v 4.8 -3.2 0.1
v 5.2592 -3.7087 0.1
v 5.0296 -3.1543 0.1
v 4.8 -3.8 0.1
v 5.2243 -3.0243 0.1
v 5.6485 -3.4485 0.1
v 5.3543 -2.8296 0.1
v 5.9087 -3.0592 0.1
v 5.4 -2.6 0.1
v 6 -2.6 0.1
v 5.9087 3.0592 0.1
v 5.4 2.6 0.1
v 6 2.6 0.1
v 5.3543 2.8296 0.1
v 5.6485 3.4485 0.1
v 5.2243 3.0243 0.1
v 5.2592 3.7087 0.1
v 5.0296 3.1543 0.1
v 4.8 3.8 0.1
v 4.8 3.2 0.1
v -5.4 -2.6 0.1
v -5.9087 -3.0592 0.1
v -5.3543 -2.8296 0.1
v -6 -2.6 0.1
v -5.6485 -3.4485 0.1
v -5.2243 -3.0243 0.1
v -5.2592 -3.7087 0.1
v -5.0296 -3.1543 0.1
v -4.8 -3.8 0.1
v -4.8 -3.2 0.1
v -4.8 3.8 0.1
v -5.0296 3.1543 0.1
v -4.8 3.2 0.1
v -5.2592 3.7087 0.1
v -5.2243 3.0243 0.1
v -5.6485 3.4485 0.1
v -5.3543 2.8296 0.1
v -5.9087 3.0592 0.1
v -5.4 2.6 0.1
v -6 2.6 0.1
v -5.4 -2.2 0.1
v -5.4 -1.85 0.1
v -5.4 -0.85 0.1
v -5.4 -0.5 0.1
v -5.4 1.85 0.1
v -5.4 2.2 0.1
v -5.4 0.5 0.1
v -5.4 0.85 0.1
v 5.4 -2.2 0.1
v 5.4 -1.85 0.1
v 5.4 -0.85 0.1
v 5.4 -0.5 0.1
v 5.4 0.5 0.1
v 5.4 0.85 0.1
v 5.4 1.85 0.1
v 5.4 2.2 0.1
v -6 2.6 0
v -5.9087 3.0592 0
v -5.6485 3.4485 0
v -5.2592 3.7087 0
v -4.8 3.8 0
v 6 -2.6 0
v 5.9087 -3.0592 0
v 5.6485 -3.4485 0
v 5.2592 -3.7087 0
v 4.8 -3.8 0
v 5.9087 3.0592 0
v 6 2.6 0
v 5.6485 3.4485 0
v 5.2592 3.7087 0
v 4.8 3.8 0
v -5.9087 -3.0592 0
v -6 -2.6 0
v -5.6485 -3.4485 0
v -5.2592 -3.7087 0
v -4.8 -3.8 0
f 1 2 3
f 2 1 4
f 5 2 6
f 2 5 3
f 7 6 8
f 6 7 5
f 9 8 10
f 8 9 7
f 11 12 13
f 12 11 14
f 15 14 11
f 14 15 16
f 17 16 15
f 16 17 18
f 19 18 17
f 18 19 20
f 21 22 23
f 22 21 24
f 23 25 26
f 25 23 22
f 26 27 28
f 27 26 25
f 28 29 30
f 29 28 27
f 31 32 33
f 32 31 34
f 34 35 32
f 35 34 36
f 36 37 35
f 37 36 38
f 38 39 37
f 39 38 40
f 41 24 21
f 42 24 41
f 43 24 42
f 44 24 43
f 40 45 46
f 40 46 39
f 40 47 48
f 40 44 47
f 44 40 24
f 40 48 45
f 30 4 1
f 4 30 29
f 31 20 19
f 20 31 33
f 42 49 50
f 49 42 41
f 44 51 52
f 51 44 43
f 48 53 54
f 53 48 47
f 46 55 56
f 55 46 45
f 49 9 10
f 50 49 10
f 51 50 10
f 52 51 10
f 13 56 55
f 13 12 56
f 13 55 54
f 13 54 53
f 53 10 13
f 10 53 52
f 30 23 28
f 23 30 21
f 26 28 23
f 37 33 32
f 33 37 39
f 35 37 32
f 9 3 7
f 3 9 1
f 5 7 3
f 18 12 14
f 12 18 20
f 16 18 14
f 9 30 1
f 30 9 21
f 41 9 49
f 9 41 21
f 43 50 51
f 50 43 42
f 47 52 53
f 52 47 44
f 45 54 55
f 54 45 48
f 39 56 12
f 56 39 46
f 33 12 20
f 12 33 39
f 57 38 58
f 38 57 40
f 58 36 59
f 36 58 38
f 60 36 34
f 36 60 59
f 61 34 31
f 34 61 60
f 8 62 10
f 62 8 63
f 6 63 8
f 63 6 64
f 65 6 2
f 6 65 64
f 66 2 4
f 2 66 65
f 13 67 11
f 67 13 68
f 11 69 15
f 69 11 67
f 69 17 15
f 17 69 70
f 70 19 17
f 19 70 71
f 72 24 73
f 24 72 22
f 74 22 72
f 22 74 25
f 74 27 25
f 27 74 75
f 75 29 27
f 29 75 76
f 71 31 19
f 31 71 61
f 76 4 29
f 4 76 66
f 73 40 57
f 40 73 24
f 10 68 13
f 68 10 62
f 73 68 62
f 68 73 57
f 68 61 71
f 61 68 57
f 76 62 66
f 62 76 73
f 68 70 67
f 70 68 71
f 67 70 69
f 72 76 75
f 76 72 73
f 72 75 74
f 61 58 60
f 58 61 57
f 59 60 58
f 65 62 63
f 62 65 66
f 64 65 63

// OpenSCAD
// file: ../p/4-4edge.scad
use <../lib.scad>
$fa=1; $fs=0.2;
function ldraw_lib__4_4edge(realsolid=false) = [
// 0 Circle 1.0
// 0 Name: 4-4edge.dat
// 0 Author: James Jessiman
// 0 !LDRAW_ORG Primitive UPDATE 2017-01
// 0 !LICENSE Licensed under CC BY 2.0 and CC BY 4.0 : see CAreadme.txt
// 
// 0 BFC CERTIFY CCW
  [0,"BFC","CERTIFY"],
  [0,"BFC","CCW"],
// 
// 0 !HISTORY 1998-12-15 [PTadmin] Official Update 1998-10
// 0 !HISTORY 2005-12-28 [PTadmin] Official Update 2005-01
// 0 !HISTORY 2007-06-24 [PTadmin] Header formatted for Contributor Agreement
// 0 !HISTORY 2008-07-01 [PTadmin] Official Update 2008-01
// 0 !HISTORY 2017-01-15 [Steffen] BFCed
// 0 !HISTORY 2017-12-30 [PTadmin] Official Update 2017-01
// 
// 
// 2 24 1 0 0 0.9239 0 0.3827
  [2,24,1,0,0,0.9239,0,0.3827],
// 2 24 0.9239 0 0.3827 0.7071 0 0.7071
  [2,24,0.9239,0,0.3827,0.7071,0,0.7071],
// 2 24 0.7071 0 0.7071 0.3827 0 0.9239
  [2,24,0.7071,0,0.7071,0.3827,0,0.9239],
// 2 24 0.3827 0 0.9239 0 0 1
  [2,24,0.3827,0,0.9239,0,0,1],
// 2 24 0 0 1 -0.3827 0 0.9239
  [2,24,0,0,1,-0.3827,0,0.9239],
// 2 24 -0.3827 0 0.9239 -0.7071 0 0.7071
  [2,24,-0.3827,0,0.9239,-0.7071,0,0.7071],
// 2 24 -0.7071 0 0.7071 -0.9239 0 0.3827
  [2,24,-0.7071,0,0.7071,-0.9239,0,0.3827],
// 2 24 -0.9239 0 0.3827 -1 0 -0
  [2,24,-0.9239,0,0.3827,-1,0,-0],
// 2 24 -1 0 -0 -0.9239 0 -0.3827
  [2,24,-1,0,-0,-0.9239,0,-0.3827],
// 2 24 -0.9239 0 -0.3827 -0.7071 0 -0.7071
  [2,24,-0.9239,0,-0.3827,-0.7071,0,-0.7071],
// 2 24 -0.7071 0 -0.7071 -0.3827 0 -0.9239
  [2,24,-0.7071,0,-0.7071,-0.3827,0,-0.9239],
// 2 24 -0.3827 0 -0.9239 0 0 -1
  [2,24,-0.3827,0,-0.9239,0,0,-1],
// 2 24 0 0 -1 0.3827 0 -0.9239
  [2,24,0,0,-1,0.3827,0,-0.9239],
// 2 24 0.3827 0 -0.9239 0.7071 0 -0.7071
  [2,24,0.3827,0,-0.9239,0.7071,0,-0.7071],
// 2 24 0.7071 0 -0.7071 0.9239 0 -0.3827
  [2,24,0.7071,0,-0.7071,0.9239,0,-0.3827],
// 2 24 0.9239 0 -0.3827 1 0 0
  [2,24,0.9239,0,-0.3827,1,0,0],
];
module ldraw_lib__4_4edge(step=0, col=false, unit=2/5, alt=false, line=0.2, solid=!$preview)
    makepoly(ldraw_lib__4_4edge(solid), step=step, col=col, unit=unit, alt=alt, line=line, solid=solid);
ldraw_lib__4_4edge(line=0.2);
// file: ../p/4-4disc.scad
use <../lib.scad>
$fa=1; $fs=0.2;
function ldraw_lib__4_4disc(realsolid=false) = [
// 0 Disc 1.0
// 0 Name: 4-4disc.dat
// 0 Author: James Jessiman
// 0 !LDRAW_ORG Primitive UPDATE 2002-02
// 0 !LICENSE Licensed under CC BY 2.0 and CC BY 4.0 : see CAreadme.txt
// 
// 0 BFC CERTIFY CCW
  [0,"BFC","CERTIFY"],
  [0,"BFC","CCW"],
// 
// 0 !HISTORY 1998-12-15 [PTadmin] Official Update 1998-10
// 0 !HISTORY 2002-03-23 [sbliss] Added BFC statement
// 0 !HISTORY 2002-04-25 [PTadmin] Official Update 2002-02
// 0 !HISTORY 2007-06-24 [PTadmin] Header formatted for Contributor Agreement
// 0 !HISTORY 2008-07-01 [PTadmin] Official Update 2008-01
// 
// 
// 3 16 0 0 0 1 0 0 0.9239 0 0.3827
  [3,16,0,0,0,1,0,0,0.9239,0,0.3827],
// 3 16 0 0 0 0.9239 0 0.3827 0.7071 0 0.7071
  [3,16,0,0,0,0.9239,0,0.3827,0.7071,0,0.7071],
// 3 16 0 0 0 0.7071 0 0.7071 0.3827 0 0.9239
  [3,16,0,0,0,0.7071,0,0.7071,0.3827,0,0.9239],
// 3 16 0 0 0 0.3827 0 0.9239 0 0 1
  [3,16,0,0,0,0.3827,0,0.9239,0,0,1],
// 3 16 0 0 0 0 0 1 -0.3827 0 0.9239
  [3,16,0,0,0,0,0,1,-0.3827,0,0.9239],
// 3 16 0 0 0 -0.3827 0 0.9239 -0.7071 0 0.7071
  [3,16,0,0,0,-0.3827,0,0.9239,-0.7071,0,0.7071],
// 3 16 0 0 0 -0.7071 0 0.7071 -0.9239 0 0.3827
  [3,16,0,0,0,-0.7071,0,0.7071,-0.9239,0,0.3827],
// 3 16 0 0 0 -0.9239 0 0.3827 -1 0 -0
  [3,16,0,0,0,-0.9239,0,0.3827,-1,0,-0],
// 3 16 0 0 0 -1 0 -0 -0.9239 0 -0.3827
  [3,16,0,0,0,-1,0,-0,-0.9239,0,-0.3827],
// 3 16 0 0 0 -0.9239 0 -0.3827 -0.7071 0 -0.7071
  [3,16,0,0,0,-0.9239,0,-0.3827,-0.7071,0,-0.7071],
// 3 16 0 0 0 -0.7071 0 -0.7071 -0.3827 0 -0.9239
  [3,16,0,0,0,-0.7071,0,-0.7071,-0.3827,0,-0.9239],
// 3 16 0 0 0 -0.3827 0 -0.9239 0 0 -1
  [3,16,0,0,0,-0.3827,0,-0.9239,0,0,-1],
// 3 16 0 0 0 0 0 -1 0.3827 0 -0.9239
  [3,16,0,0,0,0,0,-1,0.3827,0,-0.9239],
// 3 16 0 0 0 0.3827 0 -0.9239 0.7071 0 -0.7071
  [3,16,0,0,0,0.3827,0,-0.9239,0.7071,0,-0.7071],
// 3 16 0 0 0 0.7071 0 -0.7071 0.9239 0 -0.3827
  [3,16,0,0,0,0.7071,0,-0.7071,0.9239,0,-0.3827],
// 3 16 0 0 0 0.9239 0 -0.3827 1 0 0
  [3,16,0,0,0,0.9239,0,-0.3827,1,0,0],
// 0
];
module ldraw_lib__4_4disc(step=0, col=false, unit=2/5, alt=false, line=0.2, solid=!$preview)
    makepoly(ldraw_lib__4_4disc(solid), step=step, col=col, unit=unit, alt=alt, line=line, solid=solid);
ldraw_lib__4_4disc(line=0.2);
// file: ../p/4-4cyli.scad
use <../lib.scad>
$fa=1; $fs=0.2;
function ldraw_lib__4_4cyli(realsolid=false) = [
// 0 Cylinder 1.0
// 0 Name: 4-4cyli.dat
// 0 Author: James Jessiman
// 0 !LDRAW_ORG Primitive UPDATE 2005-01
// 0 !LICENSE Licensed under CC BY 2.0 and CC BY 4.0 : see CAreadme.txt
// 
// 0 BFC CERTIFY CCW
  [0,"BFC","CERTIFY"],
  [0,"BFC","CCW"],
// 
// 0 !HISTORY 1998-12-15 [PTadmin] Official Update 1998-10
// 0 !HISTORY 2002-03-23 [sbliss] Added BFC statement; merged headers from files in distributions LDraw 0.27 and Complete.
// 0 !HISTORY 2002-04-25 [PTadmin] Official Update 2002-02
// 0 !HISTORY 2004-12-14 [guyvivan] BFC CCW
// 0 !HISTORY 2005-12-28 [PTadmin] Official Update 2005-01
// 0 !HISTORY 2007-06-24 [PTadmin] Header formatted for Contributor Agreement
// 0 !HISTORY 2008-07-01 [PTadmin] Official Update 2008-01
// 
// 
// 4 16 1 1 0 0.9239 1 0.3827 0.9239 0 0.3827 1 0 0
  [4,16,1,1,0,0.9239,1,0.3827,0.9239,0,0.3827,1,0,0],
// 5 24 1 0 0 1 1 0 0.9239 0 0.3827 0.9239 0 -0.3827
  [5,24,1,0,0,1,1,0,0.9239,0,0.3827,0.9239,0,-0.3827],
// 4 16 0.9239 1 0.3827 0.7071 1 0.7071 0.7071 0 0.7071 0.9239 0 0.3827
  [4,16,0.9239,1,0.3827,0.7071,1,0.7071,0.7071,0,0.7071,0.9239,0,0.3827],
// 5 24 0.9239 0 0.3827 0.9239 1 0.3827 0.7071 0 0.7071 1 0 0
  [5,24,0.9239,0,0.3827,0.9239,1,0.3827,0.7071,0,0.7071,1,0,0],
// 4 16 0.7071 1 0.7071 0.3827 1 0.9239 0.3827 0 0.9239 0.7071 0 0.7071
  [4,16,0.7071,1,0.7071,0.3827,1,0.9239,0.3827,0,0.9239,0.7071,0,0.7071],
// 5 24 0.7071 0 0.7071 0.7071 1 0.7071 0.3827 0 0.9239 0.9239 0 0.3827
  [5,24,0.7071,0,0.7071,0.7071,1,0.7071,0.3827,0,0.9239,0.9239,0,0.3827],
// 4 16 0.3827 1 0.9239 0 1 1 0 0 1 0.3827 0 0.9239
  [4,16,0.3827,1,0.9239,0,1,1,0,0,1,0.3827,0,0.9239],
// 5 24 0.3827 0 0.9239 0.3827 1 0.9239 0 0 1 0.7071 0 0.7071
  [5,24,0.3827,0,0.9239,0.3827,1,0.9239,0,0,1,0.7071,0,0.7071],
// 4 16 0 1 1 -0.3827 1 0.9239 -0.3827 0 0.9239 0 0 1
  [4,16,0,1,1,-0.3827,1,0.9239,-0.3827,0,0.9239,0,0,1],
// 5 24 0 0 1 0 1 1 -0.3827 0 0.9239 0.3827 0 0.9239
  [5,24,0,0,1,0,1,1,-0.3827,0,0.9239,0.3827,0,0.9239],
// 4 16 -0.3827 1 0.9239 -0.7071 1 0.7071 -0.7071 0 0.7071 -0.3827 0 0.9239
  [4,16,-0.3827,1,0.9239,-0.7071,1,0.7071,-0.7071,0,0.7071,-0.3827,0,0.9239],
// 5 24 -0.3827 0 0.9239 -0.3827 1 0.9239 -0.7071 0 0.7071 0 0 1
  [5,24,-0.3827,0,0.9239,-0.3827,1,0.9239,-0.7071,0,0.7071,0,0,1],
// 4 16 -0.7071 1 0.7071 -0.9239 1 0.3827 -0.9239 0 0.3827 -0.7071 0 0.7071
  [4,16,-0.7071,1,0.7071,-0.9239,1,0.3827,-0.9239,0,0.3827,-0.7071,0,0.7071],
// 5 24 -0.7071 0 0.7071 -0.7071 1 0.7071 -0.9239 0 0.3827 -0.3827 0 0.9239
  [5,24,-0.7071,0,0.7071,-0.7071,1,0.7071,-0.9239,0,0.3827,-0.3827,0,0.9239],
// 4 16 -0.9239 1 0.3827 -1 1 0 -1 0 0 -0.9239 0 0.3827
  [4,16,-0.9239,1,0.3827,-1,1,0,-1,0,0,-0.9239,0,0.3827],
// 5 24 -0.9239 0 0.3827 -0.9239 1 0.3827 -1 0 0 -0.7071 0 0.7071
  [5,24,-0.9239,0,0.3827,-0.9239,1,0.3827,-1,0,0,-0.7071,0,0.7071],
// 4 16 -1 1 0 -0.9239 1 -0.3827 -0.9239 0 -0.3827 -1 0 0
  [4,16,-1,1,0,-0.9239,1,-0.3827,-0.9239,0,-0.3827,-1,0,0],
// 5 24 -1 0 0 -1 1 0 -0.9239 0 -0.3827 -0.9239 0 0.3827
  [5,24,-1,0,0,-1,1,0,-0.9239,0,-0.3827,-0.9239,0,0.3827],
// 4 16 -0.9239 1 -0.3827 -0.7071 1 -0.7071 -0.7071 0 -0.7071 -0.9239 0 -0.3827
  [4,16,-0.9239,1,-0.3827,-0.7071,1,-0.7071,-0.7071,0,-0.7071,-0.9239,0,-0.3827],
// 5 24 -0.9239 0 -0.3827 -0.9239 1 -0.3827 -0.7071 0 -0.7071 -1 0 0
  [5,24,-0.9239,0,-0.3827,-0.9239,1,-0.3827,-0.7071,0,-0.7071,-1,0,0],
// 4 16 -0.7071 1 -0.7071 -0.3827 1 -0.9239 -0.3827 0 -0.9239 -0.7071 0 -0.7071
  [4,16,-0.7071,1,-0.7071,-0.3827,1,-0.9239,-0.3827,0,-0.9239,-0.7071,0,-0.7071],
// 5 24 -0.7071 0 -0.7071 -0.7071 1 -0.7071 -0.3827 0 -0.9239 -0.9239 0 -0.3827
  [5,24,-0.7071,0,-0.7071,-0.7071,1,-0.7071,-0.3827,0,-0.9239,-0.9239,0,-0.3827],
// 4 16 -0.3827 1 -0.9239 0 1 -1 0 0 -1 -0.3827 0 -0.9239
  [4,16,-0.3827,1,-0.9239,0,1,-1,0,0,-1,-0.3827,0,-0.9239],
// 5 24 -0.3827 0 -0.9239 -0.3827 1 -0.9239 0 0 -1 -0.7071 0 -0.7071
  [5,24,-0.3827,0,-0.9239,-0.3827,1,-0.9239,0,0,-1,-0.7071,0,-0.7071],
// 4 16 0 1 -1 0.3827 1 -0.9239 0.3827 0 -0.9239 0 0 -1
  [4,16,0,1,-1,0.3827,1,-0.9239,0.3827,0,-0.9239,0,0,-1],
// 5 24 0 0 -1 0 1 -1 0.3827 0 -0.9239 -0.3827 0 -0.9239
  [5,24,0,0,-1,0,1,-1,0.3827,0,-0.9239,-0.3827,0,-0.9239],
// 4 16 0.3827 1 -0.9239 0.7071 1 -0.7071 0.7071 0 -0.7071 0.3827 0 -0.9239
  [4,16,0.3827,1,-0.9239,0.7071,1,-0.7071,0.7071,0,-0.7071,0.3827,0,-0.9239],
// 5 24 0.3827 0 -0.9239 0.3827 1 -0.9239 0.7071 0 -0.7071 0 0 -1
  [5,24,0.3827,0,-0.9239,0.3827,1,-0.9239,0.7071,0,-0.7071,0,0,-1],
// 4 16 0.7071 1 -0.7071 0.9239 1 -0.3827 0.9239 0 -0.3827 0.7071 0 -0.7071
  [4,16,0.7071,1,-0.7071,0.9239,1,-0.3827,0.9239,0,-0.3827,0.7071,0,-0.7071],
// 5 24 0.7071 0 -0.7071 0.7071 1 -0.7071 0.9239 0 -0.3827 0.3827 0 -0.9239
  [5,24,0.7071,0,-0.7071,0.7071,1,-0.7071,0.9239,0,-0.3827,0.3827,0,-0.9239],
// 4 16 0.9239 1 -0.3827 1 1 0 1 0 0 0.9239 0 -0.3827
  [4,16,0.9239,1,-0.3827,1,1,0,1,0,0,0.9239,0,-0.3827],
// 5 24 0.9239 0 -0.3827 0.9239 1 -0.3827 1 0 0 0.7071 0 -0.7071
  [5,24,0.9239,0,-0.3827,0.9239,1,-0.3827,1,0,0,0.7071,0,-0.7071],
// 0
];
module ldraw_lib__4_4cyli(step=0, col=false, unit=2/5, alt=false, line=0.2, solid=!$preview)
    makepoly(ldraw_lib__4_4cyli(solid), step=step, col=col, unit=unit, alt=alt, line=line, solid=solid);
ldraw_lib__4_4cyli(line=0.2);
// file: ../p/stud3.scad
use <../lib.scad>
use <4-4cyli.scad>
use <4-4disc.scad>
use <4-4edge.scad>
$fa=1; $fs=0.2;
function ldraw_lib__stud3(realsolid=false) = realsolid ? 
    [openscad(translate([0,0,-eps()], o=cylinder(4+eps(), r=4)),2)] : [
// 0 Stud Tube Solid
// 0 Name: stud3.dat
// 0 Author: James Jessiman
// 0 !LDRAW_ORG Primitive UPDATE 2012-01
// 0 !LICENSE Licensed under CC BY 2.0 and CC BY 4.0 : see CAreadme.txt
// 
// 0 BFC CERTIFY CCW
  [0,"BFC","CERTIFY"],
  [0,"BFC","CCW"],
// 
// 0 !HISTORY 2002-04-04 [sbliss] Modified for BFC compliance
// 0 !HISTORY 2002-04-25 [PTadmin] Official Update 2002-02
// 0 !HISTORY 2007-06-24 [PTadmin] Header formatted for Contributor Agreement
// 0 !HISTORY 2008-07-01 [PTadmin] Official Update 2008-01
// 0 !HISTORY 2012-02-16 [Philo] Changed to CCW
// 0 !HISTORY 2012-03-30 [PTadmin] Official Update 2012-01
// 
// 
// 1 16 0 -4 0 4 0 0 0 1 0 0 0 4 4-4edge.dat
  [1,16,0,-4,0,4,0,0,0,1,0,0,0,4, ldraw_lib__4_4edge(realsolid)],
// 1 16 0 0 0 4 0 0 0 1 0 0 0 4 4-4edge.dat
  [1,16,0,0,0,4,0,0,0,1,0,0,0,4, ldraw_lib__4_4edge(realsolid)],
// 1 16 0 -4 0 4 0 0 0 1 0 0 0 4 4-4disc.dat
  [1,16,0,-4,0,4,0,0,0,1,0,0,0,4, ldraw_lib__4_4disc(realsolid)],
// 1 16 0 -4 0 4 0 0 0 4 0 0 0 4 4-4cyli.dat
  [1,16,0,-4,0,4,0,0,0,4,0,0,0,4, ldraw_lib__4_4cyli(realsolid)],
];
module ldraw_lib__stud3(step=0, col=false, unit=2/5, alt=false, line=0.2, solid=!$preview)
    makepoly(ldraw_lib__stud3(solid), step=step, col=col, unit=unit, alt=alt, line=line, solid=solid);
ldraw_lib__stud3(line=0.2);
// file: ../p/stud.scad
use <../lib.scad>
use <4-4cyli.scad>
use <4-4disc.scad>
use <4-4edge.scad>
$fa=1; $fs=0.2;
function ldraw_lib__stud(realsolid=false) = realsolid ? 
    [openscad(translate([0,0,-eps()], o=cylinder(4+eps(), r=6)),2)] : [
// 0 Stud
// 0 Name: stud.dat
// 0 Author: James Jessiman
// 0 !LDRAW_ORG Primitive UPDATE 2012-01
// 0 !LICENSE Licensed under CC BY 2.0 and CC BY 4.0 : see CAreadme.txt
// 
// 0 BFC CERTIFY CCW
  [0,"BFC","CERTIFY"],
  [0,"BFC","CCW"],
// 
// 0 !HISTORY 2002-04-04 [sbliss] Modified for BFC compliance
// 0 !HISTORY 2002-04-25 [PTadmin] Official Update 2002-02
// 0 !HISTORY 2007-06-24 [PTadmin] Header formatted for Contributor Agreement
// 0 !HISTORY 2008-07-01 [PTadmin] Official Update 2008-01
// 0 !HISTORY 2012-02-16 [Philo] Changed to CCW
// 0 !HISTORY 2012-03-30 [PTadmin] Official Update 2012-01
// 
// 
// 1 16 0 0 0 6 0 0 0 1 0 0 0 6 4-4edge.dat
  [1,16,0,0,0,6,0,0,0,1,0,0,0,6, ldraw_lib__4_4edge(realsolid)],
// 1 16 0 -4 0 6 0 0 0 1 0 0 0 6 4-4edge.dat
  [1,16,0,-4,0,6,0,0,0,1,0,0,0,6, ldraw_lib__4_4edge(realsolid)],
// 1 16 0 0 0 6 0 0 0 -4 0 0 0 6 4-4cyli.dat
  [1,16,0,0,0,6,0,0,0,-4,0,0,0,6, ldraw_lib__4_4cyli(realsolid)],
// 1 16 0 -4 0 6 0 0 0 1 0 0 0 6 4-4disc.dat
  [1,16,0,-4,0,6,0,0,0,1,0,0,0,6, ldraw_lib__4_4disc(realsolid)],
];
module ldraw_lib__stud(step=0, col=false, unit=2/5, alt=false, line=0.2, solid=!$preview)
    makepoly(ldraw_lib__stud(solid), step=step, col=col, unit=unit, alt=alt, line=line, solid=solid);
ldraw_lib__stud(line=0.2);
// file: ../p/box5.scad
use <../lib.scad>
$fa=1; $fs=0.2;
function ldraw_lib__box5(realsolid=false) = [
// 0 Box with 5 Faces and All Edges
// 0 Name: box5.dat
// 0 Author: James Jessiman
// 0 !LDRAW_ORG Primitive UPDATE 2012-01
// 0 !LICENSE Licensed under CC BY 2.0 and CC BY 4.0 : see CAreadme.txt
// 
// 0 BFC CERTIFY CCW
  [0,"BFC","CERTIFY"],
  [0,"BFC","CCW"],
// 
// 0 !HISTORY 2002-04-03 [sbliss] Modified for BFC compliance
// 0 !HISTORY 2002-04-25 [PTadmin] Official Update 2002-02
// 0 !HISTORY 2007-06-24 [PTadmin] Header formatted for Contributor Agreement
// 0 !HISTORY 2008-07-01 [PTadmin] Official Update 2008-01
// 0 !HISTORY 2012-02-16 [Philo] Changed to CCW
// 0 !HISTORY 2012-03-30 [PTadmin] Official Update 2012-01
// 
// 
// 2 24 1 1 1 -1 1 1
  [2,24,1,1,1,-1,1,1],
// 2 24 -1 1 1 -1 1 -1
  [2,24,-1,1,1,-1,1,-1],
// 2 24 -1 1 -1 1 1 -1
  [2,24,-1,1,-1,1,1,-1],
// 2 24 1 1 -1 1 1 1
  [2,24,1,1,-1,1,1,1],
// 2 24 1 0 1 -1 0 1
  [2,24,1,0,1,-1,0,1],
// 2 24 -1 0 1 -1 0 -1
  [2,24,-1,0,1,-1,0,-1],
// 2 24 -1 0 -1 1 0 -1
  [2,24,-1,0,-1,1,0,-1],
// 2 24 1 0 -1 1 0 1
  [2,24,1,0,-1,1,0,1],
// 2 24 1 0 1 1 1 1
  [2,24,1,0,1,1,1,1],
// 2 24 -1 0 1 -1 1 1
  [2,24,-1,0,1,-1,1,1],
// 2 24 1 0 -1 1 1 -1
  [2,24,1,0,-1,1,1,-1],
// 2 24 -1 0 -1 -1 1 -1
  [2,24,-1,0,-1,-1,1,-1],
// 4 16 -1 1 1 1 1 1 1 1 -1 -1 1 -1
  [4,16,-1,1,1,1,1,1,1,1,-1,-1,1,-1],
// 4 16 -1 1 1 -1 0 1 1 0 1 1 1 1
  [4,16,-1,1,1,-1,0,1,1,0,1,1,1,1],
// 4 16 -1 1 -1 -1 0 -1 -1 0 1 -1 1 1
  [4,16,-1,1,-1,-1,0,-1,-1,0,1,-1,1,1],
// 4 16 1 1 -1 1 0 -1 -1 0 -1 -1 1 -1
  [4,16,1,1,-1,1,0,-1,-1,0,-1,-1,1,-1],
// 4 16 1 1 1 1 0 1 1 0 -1 1 1 -1
  [4,16,1,1,1,1,0,1,1,0,-1,1,1,-1],
];
module ldraw_lib__box5(step=0, col=false, unit=2/5, alt=false, line=0.2, solid=!$preview)
    makepoly(ldraw_lib__box5(solid), step=step, col=col, unit=unit, alt=alt, line=line, solid=solid);
ldraw_lib__box5(line=0.2);
// file: ../p/box4t.scad
use <../lib.scad>
$fa=1; $fs=0.2;
function ldraw_lib__box4t(realsolid=false) = [
// 0 Box with 4 Adjacent Faces and All Edges
// 0 Name: box4t.dat
// 0 Author: Tore Eriksson [Tore_Eriksson]
// 0 !LDRAW_ORG Primitive UPDATE 2003-02
// 0 !LICENSE Licensed under CC BY 2.0 and CC BY 4.0 : see CAreadme.txt
// 
// 0 BFC CERTIFY CCW
  [0,"BFC","CERTIFY"],
  [0,"BFC","CCW"],
// 
// 0 !HISTORY 1997-09-29 [PTadmin] Official Update 1997-15
// 0 !HISTORY 2002-08-31 [izanette] Modified with WINDZ for BFC compliance
// 0 !HISTORY 2003-08-01 [PTadmin] Official Update 2003-02
// 0 !HISTORY 2007-06-24 [PTadmin] Header formatted for Contributor Agreement
// 0 !HISTORY 2008-07-01 [PTadmin] Official Update 2008-01
// 
// 
// 2 24 1 1 1 -1 1 1
  [2,24,1,1,1,-1,1,1],
// 2 24 -1 1 1 -1 1 -1
  [2,24,-1,1,1,-1,1,-1],
// 2 24 -1 1 -1 1 1 -1
  [2,24,-1,1,-1,1,1,-1],
// 2 24 1 1 -1 1 1 1
  [2,24,1,1,-1,1,1,1],
// 2 24 1 0 1 -1 0 1
  [2,24,1,0,1,-1,0,1],
// 2 24 -1 0 1 -1 0 -1
  [2,24,-1,0,1,-1,0,-1],
// 2 24 -1 0 -1 1 0 -1
  [2,24,-1,0,-1,1,0,-1],
// 2 24 1 0 -1 1 0 1
  [2,24,1,0,-1,1,0,1],
// 2 24 1 0 1 1 1 1
  [2,24,1,0,1,1,1,1],
// 2 24 -1 0 1 -1 1 1
  [2,24,-1,0,1,-1,1,1],
// 2 24 1 0 -1 1 1 -1
  [2,24,1,0,-1,1,1,-1],
// 2 24 -1 0 -1 -1 1 -1
  [2,24,-1,0,-1,-1,1,-1],
// 4 16 1 1 1 1 1 -1 -1 1 -1 -1 1 1
  [4,16,1,1,1,1,1,-1,-1,1,-1,-1,1,1],
// 4 16 1 1 1 -1 1 1 -1 0 1 1 0 1
  [4,16,1,1,1,-1,1,1,-1,0,1,1,0,1],
// 4 16 -1 1 1 -1 1 -1 -1 0 -1 -1 0 1
  [4,16,-1,1,1,-1,1,-1,-1,0,-1,-1,0,1],
// 0 4 16 -1 1 -1 -1 0 -1 1 0 -1 1 1 -1
// 4 16 1 1 -1 1 1 1 1 0 1 1 0 -1
  [4,16,1,1,-1,1,1,1,1,0,1,1,0,-1],
// 0
];
module ldraw_lib__box4t(step=0, col=false, unit=2/5, alt=false, line=0.2, solid=!$preview)
    makepoly(ldraw_lib__box4t(solid), step=step, col=col, unit=unit, alt=alt, line=line, solid=solid);
ldraw_lib__box4t(line=0.2);
// file: s/3004s01.scad
use <../../lib.scad>
use <../../p/box4t.scad>
use <../../p/box5.scad>
use <../../p/stud.scad>
use <../../p/stud3.scad>
$fa=1; $fs=0.2;
function ldraw_lib__s__3004s01(realsolid=false) = [
// 0 ~Brick  1 x  2 without Front Face
// 0 Name: s\3004s01.dat
// 0 Author: James Jessiman
// 0 !LDRAW_ORG Subpart UPDATE 2003-03
// 0 !LICENSE Licensed under CC BY 2.0 and CC BY 4.0 : see CAreadme.txt
// 
// 0 BFC CERTIFY CCW
  [0,"BFC","CERTIFY"],
  [0,"BFC","CCW"],
// 
// 0 !HISTORY 2003-09-07 [jriley] Subfiling, BFC
// 0 !HISTORY 2003-12-19 [PTadmin] Official Update 2003-03
// 0 !HISTORY 2007-08-29 [PTadmin] Header formatted for Contributor Agreement
// 0 !HISTORY 2008-07-01 [PTadmin] Official Update 2008-01
// 
// 
// 1 16 0 4 0 1 0 0 0 -5 0 0 0 1 stud3.dat
  [1,16,0,4,0,1,0,0,0,-5,0,0,0,1, ldraw_lib__stud3(realsolid)],
// 0 BFC INVERTNEXT
  [0,"BFC","INVERTNEXT"],
// 1 16 0 24 0 16 0 0 0 -20 0 0 0 6 box5.dat
  [1,16,0,24,0,16,0,0,0,-20,0,0,0,6, ldraw_lib__box5(realsolid)],
// 4 16 20 24 10 16 24 6 -16 24 6 -20 24 10
  [4,16,20,24,10,16,24,6,-16,24,6,-20,24,10],
// 4 16 -20 24 10 -16 24 6 -16 24 -6 -20 24 -10
  [4,16,-20,24,10,-16,24,6,-16,24,-6,-20,24,-10],
// 4 16 -20 24 -10 -16 24 -6 16 24 -6 20 24 -10
  [4,16,-20,24,-10,-16,24,-6,16,24,-6,20,24,-10],
// 4 16 20 24 -10 16 24 -6 16 24 6 20 24 10
  [4,16,20,24,-10,16,24,-6,16,24,6,20,24,10],
// 1 16 0 24 0 20 0 0 0 -24 0 0 0 10 box4t.dat
  [1,16,0,24,0,20,0,0,0,-24,0,0,0,10, ldraw_lib__box4t(realsolid)],
// 1 16 10 0 0 1 0 0 0 1 0 0 0 1 stud.dat
  [1,16,10,0,0,1,0,0,0,1,0,0,0,1, ldraw_lib__stud(realsolid)],
// 1 16 -10 0 0 1 0 0 0 1 0 0 0 1 stud.dat
  [1,16,-10,0,0,1,0,0,0,1,0,0,0,1, ldraw_lib__stud(realsolid)],
// 0
];
module ldraw_lib__s__3004s01(step=0, col=false, unit=2/5, alt=false, line=0.2, solid=!$preview)
    makepoly(ldraw_lib__s__3004s01(solid), step=step, col=col, unit=unit, alt=alt, line=line, solid=solid);
ldraw_lib__s__3004s01(line=0.2);
// file: 3004.scad
use <../lib.scad>
use <s/3004s01.scad>
$fa=1; $fs=0.2;
function ldraw_lib__3004(realsolid=false) = [
// 0 Brick  1 x  2
// 0 Name: 3004.dat
// 0 Author: James Jessiman
// 0 !LDRAW_ORG Part UPDATE 2022-05
// 0 !LICENSE Licensed under CC BY 2.0 and CC BY 4.0 : see CAreadme.txt
// 
// 0 BFC CERTIFY CCW
  [0,"BFC","CERTIFY"],
  [0,"BFC","CCW"],
// 
// 0 !HISTORY 2001-10-26 [PTadmin] Official Update 2001-01
// 0 !HISTORY 2002-05-07 {unknown} BFC Certification
// 0 !HISTORY 2002-06-11 [PTadmin] Official Update 2002-03
// 0 !HISTORY 2007-05-07 [PTadmin] Header formatted for Contributor Agreement
// 0 !HISTORY 2008-07-01 [PTadmin] Official Update 2008-01
// 0 !HISTORY 2022-08-04 [MagFors] Using subfile
// 0 !HISTORY 2022-09-15 [PTadmin] Official Update 2022-05
// 
// 
// 1 16 0 0 0 1 0 0 0 1 0 0 0 1 s\3004s01.dat
  [1,16,0,0,0,1,0,0,0,1,0,0,0,1, ldraw_lib__s__3004s01(realsolid)],
// 4 16 -20 24 -10 20 24 -10 20 0 -10 -20 0 -10
  [4,16,-20,24,-10,20,24,-10,20,0,-10,-20,0,-10],
];
module ldraw_lib__3004(step=0, col=false, unit=2/5, alt=false, line=0.2, solid=!$preview)
    makepoly(ldraw_lib__3004(solid), step=step, col=col, unit=unit, alt=alt, line=line, solid=solid);
ldraw_lib__3004(line=0.2);
// file: ../p/1-4ring1.scad
use <../lib.scad>
$fa=1; $fs=0.2;
function ldraw_lib__1_4ring1(realsolid=false) = [
// 0 Ring  1 x 0.25
// 0 Name: 1-4ring1.dat
// 0 Author: Chris Dee [cwdee]
// 0 !LDRAW_ORG Primitive UPDATE 2012-01
// 0 !LICENSE Licensed under CC BY 2.0 and CC BY 4.0 : see CAreadme.txt
// 
// 0 BFC CERTIFY CCW
  [0,"BFC","CERTIFY"],
  [0,"BFC","CCW"],
// 
// 0 !HISTORY 2000-05-07 [PTadmin] Official Update 2000-01
// 0 !HISTORY 2002-11-22 [hafhead] Added BFC statement
// 0 !HISTORY 2002-11-30 [PTadmin] Official Update 2002-05
// 0 !HISTORY 2007-06-22 [PTadmin] Header formatted for Contributor Agreement
// 0 !HISTORY 2008-07-01 [PTadmin] Official Update 2008-01
// 0 !HISTORY 2012-02-16 [Philo] Changed to CCW
// 0 !HISTORY 2012-03-30 [PTadmin] Official Update 2012-01
// 
// 
// 4 16 2 0 0 1.8478 0 0.7654 0.9239 0 0.3827 1 0 0
  [4,16,2,0,0,1.8478,0,0.7654,0.9239,0,0.3827,1,0,0],
// 4 16 1.8478 0 0.7654 1.4142 0 1.4142 0.7071 0 0.7071 0.9239 0 0.3827
  [4,16,1.8478,0,0.7654,1.4142,0,1.4142,0.7071,0,0.7071,0.9239,0,0.3827],
// 4 16 1.4142 0 1.4142 0.7654 0 1.8478 0.3827 0 0.9239 0.7071 0 0.7071
  [4,16,1.4142,0,1.4142,0.7654,0,1.8478,0.3827,0,0.9239,0.7071,0,0.7071],
// 4 16 0.7654 0 1.8478 0 0 2 0 0 1 0.3827 0 0.9239
  [4,16,0.7654,0,1.8478,0,0,2,0,0,1,0.3827,0,0.9239],
];
module ldraw_lib__1_4ring1(step=0, col=false, unit=2/5, alt=false, line=0.2, solid=!$preview)
    makepoly(ldraw_lib__1_4ring1(solid), step=step, col=col, unit=unit, alt=alt, line=line, solid=solid);
ldraw_lib__1_4ring1(line=0.2);
// file: ../p/1-4cyli.scad
use <../lib.scad>
$fa=1; $fs=0.2;
function ldraw_lib__1_4cyli(realsolid=false) = [
// 0 Cylinder 0.25
// 0 Name: 1-4cyli.dat
// 0 Author: James Jessiman
// 0 !LDRAW_ORG Primitive UPDATE 2012-01
// 0 !LICENSE Licensed under CC BY 2.0 and CC BY 4.0 : see CAreadme.txt
// 
// 0 BFC CERTIFY CCW
  [0,"BFC","CERTIFY"],
  [0,"BFC","CCW"],
// 
// 0 !HISTORY 2002-03-23 [sbliss] Added BFC statement.
// 0 !HISTORY 2002-04-25 [PTadmin] Official Update 2002-02
// 0 !HISTORY 2007-06-22 [PTadmin] Header formatted for Contributor Agreement
// 0 !HISTORY 2008-07-01 [PTadmin] Official Update 2008-01
// 0 !HISTORY 2012-02-16 [Philo] Changed to CCW
// 0 !HISTORY 2012-03-30 [PTadmin] Official Update 2012-01
// 
// 
// 4 16 1 1 0 0.9239 1 0.3827 0.9239 0 0.3827 1 0 0
  [4,16,1,1,0,0.9239,1,0.3827,0.9239,0,0.3827,1,0,0],
// 5 24 1 0 0 1 1 0 0.9239 0 0.3827 1 0 -1
  [5,24,1,0,0,1,1,0,0.9239,0,0.3827,1,0,-1],
// 4 16 0.9239 1 0.3827 0.7071 1 0.7071 0.7071 0 0.7071 0.9239 0 0.3827
  [4,16,0.9239,1,0.3827,0.7071,1,0.7071,0.7071,0,0.7071,0.9239,0,0.3827],
// 5 24 0.9239 0 0.3827 0.9239 1 0.3827 0.7071 0 0.7071 1 0 0
  [5,24,0.9239,0,0.3827,0.9239,1,0.3827,0.7071,0,0.7071,1,0,0],
// 4 16 0.7071 1 0.7071 0.3827 1 0.9239 0.3827 0 0.9239 0.7071 0 0.7071
  [4,16,0.7071,1,0.7071,0.3827,1,0.9239,0.3827,0,0.9239,0.7071,0,0.7071],
// 5 24 0.7071 0 0.7071 0.7071 1 0.7071 0.3827 0 0.9239 0.9239 0 0.3827
  [5,24,0.7071,0,0.7071,0.7071,1,0.7071,0.3827,0,0.9239,0.9239,0,0.3827],
// 4 16 0.3827 1 0.9239 0 1 1 0 0 1 0.3827 0 0.9239
  [4,16,0.3827,1,0.9239,0,1,1,0,0,1,0.3827,0,0.9239],
// 5 24 0.3827 0 0.9239 0.3827 1 0.9239 0 0 1 0.7071 0 0.7071
  [5,24,0.3827,0,0.9239,0.3827,1,0.9239,0,0,1,0.7071,0,0.7071],
// 5 24 0 0 1 0 1 1 0.3827 0 0.9239 -1 0 1
  [5,24,0,0,1,0,1,1,0.3827,0,0.9239,-1,0,1],
];
module ldraw_lib__1_4cyli(step=0, col=false, unit=2/5, alt=false, line=0.2, solid=!$preview)
    makepoly(ldraw_lib__1_4cyli(solid), step=step, col=col, unit=unit, alt=alt, line=line, solid=solid);
ldraw_lib__1_4cyli(line=0.2);
// file: ../p/1-4chrd.scad
use <../lib.scad>
$fa=1; $fs=0.2;
function ldraw_lib__1_4chrd(realsolid=false) = [
// 0 Chord 0.25
// 0 Name: 1-4chrd.dat
// 0 Author: Tony Hafner [hafhead]
// 0 !LDRAW_ORG Primitive UPDATE 2012-02
// 0 !LICENSE Licensed under CC BY 2.0 and CC BY 4.0 : see CAreadme.txt
// 
// 0 BFC CERTIFY CCW
  [0,"BFC","CERTIFY"],
  [0,"BFC","CCW"],
// 
// 0 !HISTORY 2004-04-22 [PTadmin] Official Update 2004-02
// 0 !HISTORY 2007-10-09 [PTadmin] Header formatted for Contributor Agreement
// 0 !HISTORY 2008-07-01 [PTadmin] Official Update 2008-01
// 0 !HISTORY 2012-08-02 [MMR1988] Re-creation with PrimGen2 and Rectifier
// 0 !HISTORY 2012-08-09 [PTadmin] Official Update 2012-02
// 
// 
// 4 16 0.9239 0 0.3827 0.3827 0 0.9239 0 0 1 1 0 0
  [4,16,0.9239,0,0.3827,0.3827,0,0.9239,0,0,1,1,0,0],
// 3 16 0.7071 0 0.7071 0.3827 0 0.9239 0.9239 0 0.3827
  [3,16,0.7071,0,0.7071,0.3827,0,0.9239,0.9239,0,0.3827],
];
module ldraw_lib__1_4chrd(step=0, col=false, unit=2/5, alt=false, line=0.2, solid=!$preview)
    makepoly(ldraw_lib__1_4chrd(solid), step=step, col=col, unit=unit, alt=alt, line=line, solid=solid);
ldraw_lib__1_4chrd(line=0.2);
// main file
use <../lib.scad>
use <../p/1-4chrd.scad>
use <../p/1-4cyli.scad>
use <../p/1-4ring1.scad>
$fa=1; $fs=0.2;
function ldraw_lib__4107582b(realsolid=false) = [
// 0 Sticker  1.0 x  1.5 with Black Grille on Grey Background
// 0 Name: 4107582b.dat
// 0 Author: Damien Roux [Darats]
// 0 !LDRAW_ORG Part UPDATE 2017-01
// 0 !LICENSE Licensed under CC BY 2.0 and CC BY 4.0 : see CAreadme.txt
// 
// 0 BFC CERTIFY CCW
  [0,"BFC","CERTIFY"],
  [0,"BFC","CCW"],
// 
// 0 !KEYWORDS Set 5561
// 
// 0 !HISTORY 2014-12-23 [PTadmin] Official Update 2014-02
// 0 !HISTORY 2017-07-03 [cwdee] Use cylinder primitives with conditional lines
// 0 !HISTORY 2017-12-30 [PTadmin] Official Update 2017-01
// 
// 
// 1 0 12 -0.25 -6.5 0 0 1.5 0 1 0 -1.5 0 0 1-4ring1.dat
  [1,0,12,-0.25,-6.5,0,0,1.5,0,1,0,-1.5,0,0, ldraw_lib__1_4ring1(realsolid)],
// 1 0 12 -0.25 6.5 1.5 0 0 0 1 0 0 0 1.5 1-4ring1.dat
  [1,0,12,-0.25,6.5,1.5,0,0,0,1,0,0,0,1.5, ldraw_lib__1_4ring1(realsolid)],
// 1 0 -12 -0.25 -6.5 -1.5 0 0 0 1 0 0 0 -1.5 1-4ring1.dat
  [1,0,-12,-0.25,-6.5,-1.5,0,0,0,1,0,0,0,-1.5, ldraw_lib__1_4ring1(realsolid)],
// 1 0 -12 -0.25 6.5 0 0 -1.5 0 1 0 1.5 0 0 1-4ring1.dat
  [1,0,-12,-0.25,6.5,0,0,-1.5,0,1,0,1.5,0,0, ldraw_lib__1_4ring1(realsolid)],
// 
// 3 0 -13.5 -0.25 -5.5 -15 -0.25 -6.5 -13.5 -0.25 -6.5
  [3,0,-13.5,-0.25,-5.5,-15,-0.25,-6.5,-13.5,-0.25,-6.5],
// 3 0 -13.5 -0.25 -4.625 -15 -0.25 -6.5 -13.5 -0.25 -5.5
  [3,0,-13.5,-0.25,-4.625,-15,-0.25,-6.5,-13.5,-0.25,-5.5],
// 3 0 -13.5 -0.25 -2.125 -15 -0.25 -6.5 -13.5 -0.25 -4.625
  [3,0,-13.5,-0.25,-2.125,-15,-0.25,-6.5,-13.5,-0.25,-4.625],
// 3 0 -13.5 -0.25 -1.25 -15 -0.25 -6.5 -13.5 -0.25 -2.125
  [3,0,-13.5,-0.25,-1.25,-15,-0.25,-6.5,-13.5,-0.25,-2.125],
// 3 0 -15 -0.25 6.5 -13.5 -0.25 4.625 -13.5 -0.25 5.5
  [3,0,-15,-0.25,6.5,-13.5,-0.25,4.625,-13.5,-0.25,5.5],
// 3 0 -15 -0.25 6.5 -13.5 -0.25 5.5 -13.5 -0.25 6.5
  [3,0,-15,-0.25,6.5,-13.5,-0.25,5.5,-13.5,-0.25,6.5],
// 3 0 -15 -0.25 6.5 -13.5 -0.25 1.25 -13.5 -0.25 2.125
  [3,0,-15,-0.25,6.5,-13.5,-0.25,1.25,-13.5,-0.25,2.125],
// 4 0 -13.5 -0.25 -1.25 -13.5 -0.25 1.25 -15 -0.25 6.5 -15 -0.25 -6.5
  [4,0,-13.5,-0.25,-1.25,-13.5,-0.25,1.25,-15,-0.25,6.5,-15,-0.25,-6.5],
// 3 0 -15 -0.25 6.5 -13.5 -0.25 2.125 -13.5 -0.25 4.625
  [3,0,-15,-0.25,6.5,-13.5,-0.25,2.125,-13.5,-0.25,4.625],
// 4 0 12 -0.25 -8 -12 -0.25 -8 -12 -0.25 -9.5 12 -0.25 -9.5
  [4,0,12,-0.25,-8,-12,-0.25,-8,-12,-0.25,-9.5,12,-0.25,-9.5],
// 4 0 -12 -0.25 9.5 -12 -0.25 8 12 -0.25 8 12 -0.25 9.5
  [4,0,-12,-0.25,9.5,-12,-0.25,8,12,-0.25,8,12,-0.25,9.5],
// 4 0 13.5 -0.25 -4.625 -13.5 -0.25 -4.625 -13.5 -0.25 -5.5 13.5 -0.25 -5.5
  [4,0,13.5,-0.25,-4.625,-13.5,-0.25,-4.625,-13.5,-0.25,-5.5,13.5,-0.25,-5.5],
// 4 0 13.5 -0.25 -1.25 -13.5 -0.25 -1.25 -13.5 -0.25 -2.125 13.5 -0.25 -2.125
  [4,0,13.5,-0.25,-1.25,-13.5,-0.25,-1.25,-13.5,-0.25,-2.125,13.5,-0.25,-2.125],
// 4 0 -13.5 -0.25 2.125 -13.5 -0.25 1.25 13.5 -0.25 1.25 13.5 -0.25 2.125
  [4,0,-13.5,-0.25,2.125,-13.5,-0.25,1.25,13.5,-0.25,1.25,13.5,-0.25,2.125],
// 4 0 -13.5 -0.25 5.5 -13.5 -0.25 4.625 13.5 -0.25 4.625 13.5 -0.25 5.5
  [4,0,-13.5,-0.25,5.5,-13.5,-0.25,4.625,13.5,-0.25,4.625,13.5,-0.25,5.5],
// 3 0 13.5 -0.25 -5.5 13.5 -0.25 -6.5 15 -0.25 -6.5
  [3,0,13.5,-0.25,-5.5,13.5,-0.25,-6.5,15,-0.25,-6.5],
// 3 0 13.5 -0.25 -4.625 13.5 -0.25 -5.5 15 -0.25 -6.5
  [3,0,13.5,-0.25,-4.625,13.5,-0.25,-5.5,15,-0.25,-6.5],
// 3 0 13.5 -0.25 -2.125 13.5 -0.25 -4.625 15 -0.25 -6.5
  [3,0,13.5,-0.25,-2.125,13.5,-0.25,-4.625,15,-0.25,-6.5],
// 3 0 13.5 -0.25 -1.25 13.5 -0.25 -2.125 15 -0.25 -6.5
  [3,0,13.5,-0.25,-1.25,13.5,-0.25,-2.125,15,-0.25,-6.5],
// 3 0 15 -0.25 6.5 13.5 -0.25 5.5 13.5 -0.25 4.625
  [3,0,15,-0.25,6.5,13.5,-0.25,5.5,13.5,-0.25,4.625],
// 3 0 15 -0.25 6.5 13.5 -0.25 6.5 13.5 -0.25 5.5
  [3,0,15,-0.25,6.5,13.5,-0.25,6.5,13.5,-0.25,5.5],
// 3 0 15 -0.25 6.5 13.5 -0.25 4.625 13.5 -0.25 2.125
  [3,0,15,-0.25,6.5,13.5,-0.25,4.625,13.5,-0.25,2.125],
// 3 0 15 -0.25 6.5 13.5 -0.25 2.125 13.5 -0.25 1.25
  [3,0,15,-0.25,6.5,13.5,-0.25,2.125,13.5,-0.25,1.25],
// 4 0 15 -0.25 6.5 13.5 -0.25 1.25 13.5 -0.25 -1.25 15 -0.25 -6.5
  [4,0,15,-0.25,6.5,13.5,-0.25,1.25,13.5,-0.25,-1.25,15,-0.25,-6.5],
// 
// 1 7 -12 -0.25 -6.5 -1.5 0 0 0 1 0 0 0 -1.5 1-4chrd.dat
  [1,7,-12,-0.25,-6.5,-1.5,0,0,0,1,0,0,0,-1.5, ldraw_lib__1_4chrd(realsolid)],
// 1 7 -12 -0.25 6.5 0 0 -1.5 0 1 0 1.5 0 0 1-4chrd.dat
  [1,7,-12,-0.25,6.5,0,0,-1.5,0,1,0,1.5,0,0, ldraw_lib__1_4chrd(realsolid)],
// 1 7 12 -0.25 -6.5 0 0 1.5 0 1 0 -1.5 0 0 1-4chrd.dat
  [1,7,12,-0.25,-6.5,0,0,1.5,0,1,0,-1.5,0,0, ldraw_lib__1_4chrd(realsolid)],
// 1 7 12 -0.25 6.5 1.5 0 0 0 1 0 0 0 1.5 1-4chrd.dat
  [1,7,12,-0.25,6.5,1.5,0,0,0,1,0,0,0,1.5, ldraw_lib__1_4chrd(realsolid)],
// 4 7 13.5 -0.25 -6.5 -13.5 -0.25 -6.5 -12 -0.25 -8 12 -0.25 -8
  [4,7,13.5,-0.25,-6.5,-13.5,-0.25,-6.5,-12,-0.25,-8,12,-0.25,-8],
// 4 7 13.5 -0.25 -5.5 -13.5 -0.25 -5.5 -13.5 -0.25 -6.5 13.5 -0.25 -6.5
  [4,7,13.5,-0.25,-5.5,-13.5,-0.25,-5.5,-13.5,-0.25,-6.5,13.5,-0.25,-6.5],
// 4 7 13.5 -0.25 -2.125 -13.5 -0.25 -2.125 -13.5 -0.25 -4.625 13.5 -0.25 -4.625
  [4,7,13.5,-0.25,-2.125,-13.5,-0.25,-2.125,-13.5,-0.25,-4.625,13.5,-0.25,-4.625],
// 4 7 -13.5 -0.25 1.25 -13.5 -0.25 -1.25 13.5 -0.25 -1.25 13.5 -0.25 1.25
  [4,7,-13.5,-0.25,1.25,-13.5,-0.25,-1.25,13.5,-0.25,-1.25,13.5,-0.25,1.25],
// 4 7 -13.5 -0.25 4.625 -13.5 -0.25 2.125 13.5 -0.25 2.125 13.5 -0.25 4.625
  [4,7,-13.5,-0.25,4.625,-13.5,-0.25,2.125,13.5,-0.25,2.125,13.5,-0.25,4.625],
// 4 7 -13.5 -0.25 6.5 -13.5 -0.25 5.5 13.5 -0.25 5.5 13.5 -0.25 6.5
  [4,7,-13.5,-0.25,6.5,-13.5,-0.25,5.5,13.5,-0.25,5.5,13.5,-0.25,6.5],
// 4 7 -12 -0.25 8 -13.5 -0.25 6.5 13.5 -0.25 6.5 12 -0.25 8
  [4,7,-12,-0.25,8,-13.5,-0.25,6.5,13.5,-0.25,6.5,12,-0.25,8],
// 
// 1 16 -12 0 6.5 -3 0 0 0 -0.25 0 0 0 3 1-4cyli.dat
  [1,16,-12,0,6.5,-3,0,0,0,-0.25,0,0,0,3, ldraw_lib__1_4cyli(realsolid)],
// 1 16 12 0 -6.5 3 0 0 0 -0.25 0 0 0 -3 1-4cyli.dat
  [1,16,12,0,-6.5,3,0,0,0,-0.25,0,0,0,-3, ldraw_lib__1_4cyli(realsolid)],
// 1 16 12 0 6.5 3 0 0 0 -0.25 0 0 0 3 1-4cyli.dat
  [1,16,12,0,6.5,3,0,0,0,-0.25,0,0,0,3, ldraw_lib__1_4cyli(realsolid)],
// 1 16 -12 0 -6.5 -3 0 0 0 -0.25 0 0 0 -3 1-4cyli.dat
  [1,16,-12,0,-6.5,-3,0,0,0,-0.25,0,0,0,-3, ldraw_lib__1_4cyli(realsolid)],
// 
// 4 16 -12 -0.25 9.5 12 -0.25 9.5 12 0 9.5 -12 0 9.5
  [4,16,-12,-0.25,9.5,12,-0.25,9.5,12,0,9.5,-12,0,9.5],
// 4 16 12 -0.25 -9.5 -12 -0.25 -9.5 -12 0 -9.5 12 0 -9.5
  [4,16,12,-0.25,-9.5,-12,-0.25,-9.5,-12,0,-9.5,12,0,-9.5],
// 4 16 -15 -0.25 -6.5 -15 -0.25 6.5 -15 0 6.5 -15 0 -6.5
  [4,16,-15,-0.25,-6.5,-15,-0.25,6.5,-15,0,6.5,-15,0,-6.5],
// 4 16 15 -0.25 6.5 15 -0.25 -6.5 15 0 -6.5 15 0 6.5
  [4,16,15,-0.25,6.5,15,-0.25,-6.5,15,0,-6.5,15,0,6.5],
// 
// 4 16 15 0 6.5 15 0 -6.5 -15 0 -6.5 -15 0 6.5
  [4,16,15,0,6.5,15,0,-6.5,-15,0,-6.5,-15,0,6.5],
// 4 16 15 0 6.5 -15 0 6.5 -12 0 9.5 12 0 9.5
  [4,16,15,0,6.5,-15,0,6.5,-12,0,9.5,12,0,9.5],
// 4 16 -15 0 -6.5 15 0 -6.5 12 0 -9.5 -12 0 -9.5
  [4,16,-15,0,-6.5,15,0,-6.5,12,0,-9.5,-12,0,-9.5],
// 1 16 12 0 6.5 3 0 0 0 -1 0 0 0 3 1-4chrd.dat
  [1,16,12,0,6.5,3,0,0,0,-1,0,0,0,3, ldraw_lib__1_4chrd(realsolid)],
// 1 16 -12 0 -6.5 -3 0 0 0 -1 0 0 0 -3 1-4chrd.dat
  [1,16,-12,0,-6.5,-3,0,0,0,-1,0,0,0,-3, ldraw_lib__1_4chrd(realsolid)],
// 1 16 -12 0 6.5 -3 0 0 0 -1 0 0 0 3 1-4chrd.dat
  [1,16,-12,0,6.5,-3,0,0,0,-1,0,0,0,3, ldraw_lib__1_4chrd(realsolid)],
// 1 16 12 0 -6.5 3 0 0 0 -1 0 0 0 -3 1-4chrd.dat
  [1,16,12,0,-6.5,3,0,0,0,-1,0,0,0,-3, ldraw_lib__1_4chrd(realsolid)],
];
module ldraw_lib__4107582b(step=0, col=false, unit=2/5, alt=false, line=0.2, solid=!$preview)
    makepoly(ldraw_lib__4107582b(solid), step=step, col=col, unit=unit, alt=alt, line=line, solid=solid);
ldraw_lib__4107582b(line=0.2);
